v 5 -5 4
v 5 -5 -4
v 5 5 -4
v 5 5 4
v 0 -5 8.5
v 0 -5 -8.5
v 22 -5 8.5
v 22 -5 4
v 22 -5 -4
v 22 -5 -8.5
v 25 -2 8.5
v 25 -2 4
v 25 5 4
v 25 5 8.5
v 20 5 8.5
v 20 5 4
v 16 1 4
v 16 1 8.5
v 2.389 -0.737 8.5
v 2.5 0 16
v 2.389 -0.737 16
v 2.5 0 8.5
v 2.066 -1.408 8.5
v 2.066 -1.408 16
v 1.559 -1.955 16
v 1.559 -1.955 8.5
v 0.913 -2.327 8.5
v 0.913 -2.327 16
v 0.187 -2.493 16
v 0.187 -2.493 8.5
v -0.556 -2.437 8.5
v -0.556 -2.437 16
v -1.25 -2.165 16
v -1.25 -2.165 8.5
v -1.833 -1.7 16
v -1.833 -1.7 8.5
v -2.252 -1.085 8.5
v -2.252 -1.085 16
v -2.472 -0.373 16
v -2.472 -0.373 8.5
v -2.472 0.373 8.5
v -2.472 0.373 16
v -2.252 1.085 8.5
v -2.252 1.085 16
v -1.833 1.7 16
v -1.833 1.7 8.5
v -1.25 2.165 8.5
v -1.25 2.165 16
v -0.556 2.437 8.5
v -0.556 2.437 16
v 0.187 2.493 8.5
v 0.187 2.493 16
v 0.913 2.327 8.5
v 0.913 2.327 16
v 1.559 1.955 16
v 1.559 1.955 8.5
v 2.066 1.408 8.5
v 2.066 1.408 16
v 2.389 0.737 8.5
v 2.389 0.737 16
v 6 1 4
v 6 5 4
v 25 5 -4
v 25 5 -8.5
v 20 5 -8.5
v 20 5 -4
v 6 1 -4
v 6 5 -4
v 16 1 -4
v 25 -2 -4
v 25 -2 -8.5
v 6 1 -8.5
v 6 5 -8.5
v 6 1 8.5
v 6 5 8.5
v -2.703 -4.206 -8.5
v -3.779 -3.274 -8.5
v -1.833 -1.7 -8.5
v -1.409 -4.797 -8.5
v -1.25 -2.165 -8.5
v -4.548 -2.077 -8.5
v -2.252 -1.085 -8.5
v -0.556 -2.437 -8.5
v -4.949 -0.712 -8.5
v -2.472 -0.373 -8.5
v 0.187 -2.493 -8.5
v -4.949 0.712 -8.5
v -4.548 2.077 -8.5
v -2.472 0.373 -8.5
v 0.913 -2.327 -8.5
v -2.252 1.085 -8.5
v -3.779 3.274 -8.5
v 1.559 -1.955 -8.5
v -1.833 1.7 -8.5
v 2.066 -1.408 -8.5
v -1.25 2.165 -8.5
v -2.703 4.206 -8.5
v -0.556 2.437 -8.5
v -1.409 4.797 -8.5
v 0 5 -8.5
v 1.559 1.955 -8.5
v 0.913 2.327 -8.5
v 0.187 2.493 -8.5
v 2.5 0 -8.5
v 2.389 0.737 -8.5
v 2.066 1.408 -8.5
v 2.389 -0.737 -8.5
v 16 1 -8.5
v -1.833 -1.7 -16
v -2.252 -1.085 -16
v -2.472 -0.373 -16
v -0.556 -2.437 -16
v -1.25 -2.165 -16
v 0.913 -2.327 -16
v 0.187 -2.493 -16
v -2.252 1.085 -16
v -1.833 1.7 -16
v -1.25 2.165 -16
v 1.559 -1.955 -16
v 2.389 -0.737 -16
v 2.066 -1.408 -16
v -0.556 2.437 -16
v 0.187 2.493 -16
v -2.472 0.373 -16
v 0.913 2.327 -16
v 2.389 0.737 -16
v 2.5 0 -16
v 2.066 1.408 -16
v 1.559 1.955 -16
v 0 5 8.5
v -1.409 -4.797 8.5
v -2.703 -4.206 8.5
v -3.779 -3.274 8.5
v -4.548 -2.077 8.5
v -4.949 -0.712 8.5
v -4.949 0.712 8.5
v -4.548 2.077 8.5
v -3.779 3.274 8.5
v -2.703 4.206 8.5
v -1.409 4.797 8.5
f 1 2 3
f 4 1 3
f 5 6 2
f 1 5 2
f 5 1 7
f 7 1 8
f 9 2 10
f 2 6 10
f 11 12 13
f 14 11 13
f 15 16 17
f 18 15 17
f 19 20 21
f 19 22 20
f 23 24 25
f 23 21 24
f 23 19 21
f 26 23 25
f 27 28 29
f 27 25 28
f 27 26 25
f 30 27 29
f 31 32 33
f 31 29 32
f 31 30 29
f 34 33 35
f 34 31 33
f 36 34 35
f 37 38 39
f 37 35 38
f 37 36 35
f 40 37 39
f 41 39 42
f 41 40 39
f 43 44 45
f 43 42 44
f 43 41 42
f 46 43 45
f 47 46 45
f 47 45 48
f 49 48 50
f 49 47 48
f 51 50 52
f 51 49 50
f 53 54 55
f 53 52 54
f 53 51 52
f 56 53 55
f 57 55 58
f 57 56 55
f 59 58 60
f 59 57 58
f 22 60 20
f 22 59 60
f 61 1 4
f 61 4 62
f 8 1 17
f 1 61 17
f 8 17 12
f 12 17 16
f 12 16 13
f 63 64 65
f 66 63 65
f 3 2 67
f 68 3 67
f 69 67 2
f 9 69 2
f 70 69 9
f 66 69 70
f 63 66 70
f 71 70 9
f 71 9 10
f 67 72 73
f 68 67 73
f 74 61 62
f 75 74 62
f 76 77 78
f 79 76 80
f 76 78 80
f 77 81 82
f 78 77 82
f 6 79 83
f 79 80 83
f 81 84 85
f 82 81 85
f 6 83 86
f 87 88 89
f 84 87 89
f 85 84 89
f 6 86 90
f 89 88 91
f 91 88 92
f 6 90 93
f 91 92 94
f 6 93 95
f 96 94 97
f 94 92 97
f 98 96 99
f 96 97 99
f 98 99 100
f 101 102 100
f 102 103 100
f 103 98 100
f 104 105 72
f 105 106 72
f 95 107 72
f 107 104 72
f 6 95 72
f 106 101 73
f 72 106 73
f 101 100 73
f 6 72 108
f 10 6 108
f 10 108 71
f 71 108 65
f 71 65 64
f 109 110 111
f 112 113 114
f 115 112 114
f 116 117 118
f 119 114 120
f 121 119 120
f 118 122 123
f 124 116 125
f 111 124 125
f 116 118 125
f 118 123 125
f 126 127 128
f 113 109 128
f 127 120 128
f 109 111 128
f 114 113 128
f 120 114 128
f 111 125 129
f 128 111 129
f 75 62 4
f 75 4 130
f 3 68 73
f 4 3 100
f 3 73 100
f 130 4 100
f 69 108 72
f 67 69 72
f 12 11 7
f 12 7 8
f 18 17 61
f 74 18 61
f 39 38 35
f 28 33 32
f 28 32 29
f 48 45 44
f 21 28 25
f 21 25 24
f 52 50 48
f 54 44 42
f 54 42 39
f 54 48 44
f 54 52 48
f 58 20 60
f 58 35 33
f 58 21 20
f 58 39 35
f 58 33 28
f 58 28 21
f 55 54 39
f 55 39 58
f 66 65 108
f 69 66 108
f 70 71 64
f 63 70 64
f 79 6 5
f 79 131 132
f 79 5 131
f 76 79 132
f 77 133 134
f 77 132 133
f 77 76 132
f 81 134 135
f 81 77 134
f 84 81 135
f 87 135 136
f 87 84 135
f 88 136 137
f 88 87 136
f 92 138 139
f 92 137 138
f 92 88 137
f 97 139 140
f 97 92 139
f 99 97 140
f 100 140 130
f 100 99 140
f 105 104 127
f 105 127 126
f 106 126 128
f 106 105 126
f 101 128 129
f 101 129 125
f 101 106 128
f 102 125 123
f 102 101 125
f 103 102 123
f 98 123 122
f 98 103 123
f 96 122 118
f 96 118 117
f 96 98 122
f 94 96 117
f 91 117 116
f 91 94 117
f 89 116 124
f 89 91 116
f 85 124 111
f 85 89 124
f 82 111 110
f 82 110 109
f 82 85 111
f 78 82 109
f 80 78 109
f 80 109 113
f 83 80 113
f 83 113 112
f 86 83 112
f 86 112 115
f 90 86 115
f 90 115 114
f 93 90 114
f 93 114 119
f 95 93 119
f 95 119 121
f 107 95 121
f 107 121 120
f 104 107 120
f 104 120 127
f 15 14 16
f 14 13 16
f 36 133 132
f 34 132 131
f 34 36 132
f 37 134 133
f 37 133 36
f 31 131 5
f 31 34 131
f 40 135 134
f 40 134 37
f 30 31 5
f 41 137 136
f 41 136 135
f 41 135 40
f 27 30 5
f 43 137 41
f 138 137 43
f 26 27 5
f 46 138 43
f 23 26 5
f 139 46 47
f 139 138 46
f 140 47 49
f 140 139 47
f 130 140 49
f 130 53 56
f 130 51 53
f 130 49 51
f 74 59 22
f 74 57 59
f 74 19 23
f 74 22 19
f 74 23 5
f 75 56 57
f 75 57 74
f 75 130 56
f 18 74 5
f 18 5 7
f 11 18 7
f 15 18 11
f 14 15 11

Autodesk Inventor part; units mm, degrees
ref_plane "YZ Plane" through (0, 0, 0) normal (1, 0, 0) x (0, 1, 0)
ref_plane "XZ Plane" through (0, 0, 0) normal (0, 1, 0) x (-1, 0, 0)
ref_plane "XY Plane" through (0, 0, 0) normal (0, 0, 1) x (1, 0, 0)
sketch "스케치1" plane through (0, 0, 0) normal (0, 0, 1) x (1, 0, 0)
  circle A0 centre (0, 0) radius 2.5
  circle A1 centre (0, 0) radius 5
  line L0 (0, -5) -> (25, -5)
  line L1 (25, -5) -> (25, 5)
  line L2 (25, 5) -> (20, 5)
  line L3 (20, 5) -> (16, 1)
  line L4 (16, 1) -> (6, 1)
  line L5 (6, 1) -> (6, 5)
  line L6 (6, 5) -> (0, 5)
  dimension "d0" = 5
  dimension "d1" = 10
  dimension "d2" = 25
  dimension "d3" = 10
  dimension "d4" = 90
  dimension "d5" = 5
  dimension "d6" = 90
  dimension "d7" = 10
  dimension "d8" = 4
  dimension "d9" = 4
extrude "돌출1" add sketch "스케치1" along normal mid plane 17
extrude "돌출2" add sketch "스케치1" along normal mid plane 32 contours A0
sketch "스케치2" plane through (0, 0, 0) normal (0, 0, 1) x (1, 0, 0)
  line L0 (5, 11.5318) -> (29.4408, 11.5318)
  line L1 (29.4408, 11.5318) -> (29.4408, -9.0869)
  line L2 (29.4408, -9.0869) -> (5, -9.0869)
  line L3 (5, -9.0869) -> (5, 11.5318)
  line L4 (25, 5) -> (25, -5) projected
  point P0 (0, 0)
  dimension "d14" = 20
extrude "돌출3" cut sketch "스케치2" along normal mid plane 8
chamfer "모따기1" distance 3 angle 45 2 edges at (25, -5, 6.25) (25, -5, -6.25)
properties part number "10-2"
